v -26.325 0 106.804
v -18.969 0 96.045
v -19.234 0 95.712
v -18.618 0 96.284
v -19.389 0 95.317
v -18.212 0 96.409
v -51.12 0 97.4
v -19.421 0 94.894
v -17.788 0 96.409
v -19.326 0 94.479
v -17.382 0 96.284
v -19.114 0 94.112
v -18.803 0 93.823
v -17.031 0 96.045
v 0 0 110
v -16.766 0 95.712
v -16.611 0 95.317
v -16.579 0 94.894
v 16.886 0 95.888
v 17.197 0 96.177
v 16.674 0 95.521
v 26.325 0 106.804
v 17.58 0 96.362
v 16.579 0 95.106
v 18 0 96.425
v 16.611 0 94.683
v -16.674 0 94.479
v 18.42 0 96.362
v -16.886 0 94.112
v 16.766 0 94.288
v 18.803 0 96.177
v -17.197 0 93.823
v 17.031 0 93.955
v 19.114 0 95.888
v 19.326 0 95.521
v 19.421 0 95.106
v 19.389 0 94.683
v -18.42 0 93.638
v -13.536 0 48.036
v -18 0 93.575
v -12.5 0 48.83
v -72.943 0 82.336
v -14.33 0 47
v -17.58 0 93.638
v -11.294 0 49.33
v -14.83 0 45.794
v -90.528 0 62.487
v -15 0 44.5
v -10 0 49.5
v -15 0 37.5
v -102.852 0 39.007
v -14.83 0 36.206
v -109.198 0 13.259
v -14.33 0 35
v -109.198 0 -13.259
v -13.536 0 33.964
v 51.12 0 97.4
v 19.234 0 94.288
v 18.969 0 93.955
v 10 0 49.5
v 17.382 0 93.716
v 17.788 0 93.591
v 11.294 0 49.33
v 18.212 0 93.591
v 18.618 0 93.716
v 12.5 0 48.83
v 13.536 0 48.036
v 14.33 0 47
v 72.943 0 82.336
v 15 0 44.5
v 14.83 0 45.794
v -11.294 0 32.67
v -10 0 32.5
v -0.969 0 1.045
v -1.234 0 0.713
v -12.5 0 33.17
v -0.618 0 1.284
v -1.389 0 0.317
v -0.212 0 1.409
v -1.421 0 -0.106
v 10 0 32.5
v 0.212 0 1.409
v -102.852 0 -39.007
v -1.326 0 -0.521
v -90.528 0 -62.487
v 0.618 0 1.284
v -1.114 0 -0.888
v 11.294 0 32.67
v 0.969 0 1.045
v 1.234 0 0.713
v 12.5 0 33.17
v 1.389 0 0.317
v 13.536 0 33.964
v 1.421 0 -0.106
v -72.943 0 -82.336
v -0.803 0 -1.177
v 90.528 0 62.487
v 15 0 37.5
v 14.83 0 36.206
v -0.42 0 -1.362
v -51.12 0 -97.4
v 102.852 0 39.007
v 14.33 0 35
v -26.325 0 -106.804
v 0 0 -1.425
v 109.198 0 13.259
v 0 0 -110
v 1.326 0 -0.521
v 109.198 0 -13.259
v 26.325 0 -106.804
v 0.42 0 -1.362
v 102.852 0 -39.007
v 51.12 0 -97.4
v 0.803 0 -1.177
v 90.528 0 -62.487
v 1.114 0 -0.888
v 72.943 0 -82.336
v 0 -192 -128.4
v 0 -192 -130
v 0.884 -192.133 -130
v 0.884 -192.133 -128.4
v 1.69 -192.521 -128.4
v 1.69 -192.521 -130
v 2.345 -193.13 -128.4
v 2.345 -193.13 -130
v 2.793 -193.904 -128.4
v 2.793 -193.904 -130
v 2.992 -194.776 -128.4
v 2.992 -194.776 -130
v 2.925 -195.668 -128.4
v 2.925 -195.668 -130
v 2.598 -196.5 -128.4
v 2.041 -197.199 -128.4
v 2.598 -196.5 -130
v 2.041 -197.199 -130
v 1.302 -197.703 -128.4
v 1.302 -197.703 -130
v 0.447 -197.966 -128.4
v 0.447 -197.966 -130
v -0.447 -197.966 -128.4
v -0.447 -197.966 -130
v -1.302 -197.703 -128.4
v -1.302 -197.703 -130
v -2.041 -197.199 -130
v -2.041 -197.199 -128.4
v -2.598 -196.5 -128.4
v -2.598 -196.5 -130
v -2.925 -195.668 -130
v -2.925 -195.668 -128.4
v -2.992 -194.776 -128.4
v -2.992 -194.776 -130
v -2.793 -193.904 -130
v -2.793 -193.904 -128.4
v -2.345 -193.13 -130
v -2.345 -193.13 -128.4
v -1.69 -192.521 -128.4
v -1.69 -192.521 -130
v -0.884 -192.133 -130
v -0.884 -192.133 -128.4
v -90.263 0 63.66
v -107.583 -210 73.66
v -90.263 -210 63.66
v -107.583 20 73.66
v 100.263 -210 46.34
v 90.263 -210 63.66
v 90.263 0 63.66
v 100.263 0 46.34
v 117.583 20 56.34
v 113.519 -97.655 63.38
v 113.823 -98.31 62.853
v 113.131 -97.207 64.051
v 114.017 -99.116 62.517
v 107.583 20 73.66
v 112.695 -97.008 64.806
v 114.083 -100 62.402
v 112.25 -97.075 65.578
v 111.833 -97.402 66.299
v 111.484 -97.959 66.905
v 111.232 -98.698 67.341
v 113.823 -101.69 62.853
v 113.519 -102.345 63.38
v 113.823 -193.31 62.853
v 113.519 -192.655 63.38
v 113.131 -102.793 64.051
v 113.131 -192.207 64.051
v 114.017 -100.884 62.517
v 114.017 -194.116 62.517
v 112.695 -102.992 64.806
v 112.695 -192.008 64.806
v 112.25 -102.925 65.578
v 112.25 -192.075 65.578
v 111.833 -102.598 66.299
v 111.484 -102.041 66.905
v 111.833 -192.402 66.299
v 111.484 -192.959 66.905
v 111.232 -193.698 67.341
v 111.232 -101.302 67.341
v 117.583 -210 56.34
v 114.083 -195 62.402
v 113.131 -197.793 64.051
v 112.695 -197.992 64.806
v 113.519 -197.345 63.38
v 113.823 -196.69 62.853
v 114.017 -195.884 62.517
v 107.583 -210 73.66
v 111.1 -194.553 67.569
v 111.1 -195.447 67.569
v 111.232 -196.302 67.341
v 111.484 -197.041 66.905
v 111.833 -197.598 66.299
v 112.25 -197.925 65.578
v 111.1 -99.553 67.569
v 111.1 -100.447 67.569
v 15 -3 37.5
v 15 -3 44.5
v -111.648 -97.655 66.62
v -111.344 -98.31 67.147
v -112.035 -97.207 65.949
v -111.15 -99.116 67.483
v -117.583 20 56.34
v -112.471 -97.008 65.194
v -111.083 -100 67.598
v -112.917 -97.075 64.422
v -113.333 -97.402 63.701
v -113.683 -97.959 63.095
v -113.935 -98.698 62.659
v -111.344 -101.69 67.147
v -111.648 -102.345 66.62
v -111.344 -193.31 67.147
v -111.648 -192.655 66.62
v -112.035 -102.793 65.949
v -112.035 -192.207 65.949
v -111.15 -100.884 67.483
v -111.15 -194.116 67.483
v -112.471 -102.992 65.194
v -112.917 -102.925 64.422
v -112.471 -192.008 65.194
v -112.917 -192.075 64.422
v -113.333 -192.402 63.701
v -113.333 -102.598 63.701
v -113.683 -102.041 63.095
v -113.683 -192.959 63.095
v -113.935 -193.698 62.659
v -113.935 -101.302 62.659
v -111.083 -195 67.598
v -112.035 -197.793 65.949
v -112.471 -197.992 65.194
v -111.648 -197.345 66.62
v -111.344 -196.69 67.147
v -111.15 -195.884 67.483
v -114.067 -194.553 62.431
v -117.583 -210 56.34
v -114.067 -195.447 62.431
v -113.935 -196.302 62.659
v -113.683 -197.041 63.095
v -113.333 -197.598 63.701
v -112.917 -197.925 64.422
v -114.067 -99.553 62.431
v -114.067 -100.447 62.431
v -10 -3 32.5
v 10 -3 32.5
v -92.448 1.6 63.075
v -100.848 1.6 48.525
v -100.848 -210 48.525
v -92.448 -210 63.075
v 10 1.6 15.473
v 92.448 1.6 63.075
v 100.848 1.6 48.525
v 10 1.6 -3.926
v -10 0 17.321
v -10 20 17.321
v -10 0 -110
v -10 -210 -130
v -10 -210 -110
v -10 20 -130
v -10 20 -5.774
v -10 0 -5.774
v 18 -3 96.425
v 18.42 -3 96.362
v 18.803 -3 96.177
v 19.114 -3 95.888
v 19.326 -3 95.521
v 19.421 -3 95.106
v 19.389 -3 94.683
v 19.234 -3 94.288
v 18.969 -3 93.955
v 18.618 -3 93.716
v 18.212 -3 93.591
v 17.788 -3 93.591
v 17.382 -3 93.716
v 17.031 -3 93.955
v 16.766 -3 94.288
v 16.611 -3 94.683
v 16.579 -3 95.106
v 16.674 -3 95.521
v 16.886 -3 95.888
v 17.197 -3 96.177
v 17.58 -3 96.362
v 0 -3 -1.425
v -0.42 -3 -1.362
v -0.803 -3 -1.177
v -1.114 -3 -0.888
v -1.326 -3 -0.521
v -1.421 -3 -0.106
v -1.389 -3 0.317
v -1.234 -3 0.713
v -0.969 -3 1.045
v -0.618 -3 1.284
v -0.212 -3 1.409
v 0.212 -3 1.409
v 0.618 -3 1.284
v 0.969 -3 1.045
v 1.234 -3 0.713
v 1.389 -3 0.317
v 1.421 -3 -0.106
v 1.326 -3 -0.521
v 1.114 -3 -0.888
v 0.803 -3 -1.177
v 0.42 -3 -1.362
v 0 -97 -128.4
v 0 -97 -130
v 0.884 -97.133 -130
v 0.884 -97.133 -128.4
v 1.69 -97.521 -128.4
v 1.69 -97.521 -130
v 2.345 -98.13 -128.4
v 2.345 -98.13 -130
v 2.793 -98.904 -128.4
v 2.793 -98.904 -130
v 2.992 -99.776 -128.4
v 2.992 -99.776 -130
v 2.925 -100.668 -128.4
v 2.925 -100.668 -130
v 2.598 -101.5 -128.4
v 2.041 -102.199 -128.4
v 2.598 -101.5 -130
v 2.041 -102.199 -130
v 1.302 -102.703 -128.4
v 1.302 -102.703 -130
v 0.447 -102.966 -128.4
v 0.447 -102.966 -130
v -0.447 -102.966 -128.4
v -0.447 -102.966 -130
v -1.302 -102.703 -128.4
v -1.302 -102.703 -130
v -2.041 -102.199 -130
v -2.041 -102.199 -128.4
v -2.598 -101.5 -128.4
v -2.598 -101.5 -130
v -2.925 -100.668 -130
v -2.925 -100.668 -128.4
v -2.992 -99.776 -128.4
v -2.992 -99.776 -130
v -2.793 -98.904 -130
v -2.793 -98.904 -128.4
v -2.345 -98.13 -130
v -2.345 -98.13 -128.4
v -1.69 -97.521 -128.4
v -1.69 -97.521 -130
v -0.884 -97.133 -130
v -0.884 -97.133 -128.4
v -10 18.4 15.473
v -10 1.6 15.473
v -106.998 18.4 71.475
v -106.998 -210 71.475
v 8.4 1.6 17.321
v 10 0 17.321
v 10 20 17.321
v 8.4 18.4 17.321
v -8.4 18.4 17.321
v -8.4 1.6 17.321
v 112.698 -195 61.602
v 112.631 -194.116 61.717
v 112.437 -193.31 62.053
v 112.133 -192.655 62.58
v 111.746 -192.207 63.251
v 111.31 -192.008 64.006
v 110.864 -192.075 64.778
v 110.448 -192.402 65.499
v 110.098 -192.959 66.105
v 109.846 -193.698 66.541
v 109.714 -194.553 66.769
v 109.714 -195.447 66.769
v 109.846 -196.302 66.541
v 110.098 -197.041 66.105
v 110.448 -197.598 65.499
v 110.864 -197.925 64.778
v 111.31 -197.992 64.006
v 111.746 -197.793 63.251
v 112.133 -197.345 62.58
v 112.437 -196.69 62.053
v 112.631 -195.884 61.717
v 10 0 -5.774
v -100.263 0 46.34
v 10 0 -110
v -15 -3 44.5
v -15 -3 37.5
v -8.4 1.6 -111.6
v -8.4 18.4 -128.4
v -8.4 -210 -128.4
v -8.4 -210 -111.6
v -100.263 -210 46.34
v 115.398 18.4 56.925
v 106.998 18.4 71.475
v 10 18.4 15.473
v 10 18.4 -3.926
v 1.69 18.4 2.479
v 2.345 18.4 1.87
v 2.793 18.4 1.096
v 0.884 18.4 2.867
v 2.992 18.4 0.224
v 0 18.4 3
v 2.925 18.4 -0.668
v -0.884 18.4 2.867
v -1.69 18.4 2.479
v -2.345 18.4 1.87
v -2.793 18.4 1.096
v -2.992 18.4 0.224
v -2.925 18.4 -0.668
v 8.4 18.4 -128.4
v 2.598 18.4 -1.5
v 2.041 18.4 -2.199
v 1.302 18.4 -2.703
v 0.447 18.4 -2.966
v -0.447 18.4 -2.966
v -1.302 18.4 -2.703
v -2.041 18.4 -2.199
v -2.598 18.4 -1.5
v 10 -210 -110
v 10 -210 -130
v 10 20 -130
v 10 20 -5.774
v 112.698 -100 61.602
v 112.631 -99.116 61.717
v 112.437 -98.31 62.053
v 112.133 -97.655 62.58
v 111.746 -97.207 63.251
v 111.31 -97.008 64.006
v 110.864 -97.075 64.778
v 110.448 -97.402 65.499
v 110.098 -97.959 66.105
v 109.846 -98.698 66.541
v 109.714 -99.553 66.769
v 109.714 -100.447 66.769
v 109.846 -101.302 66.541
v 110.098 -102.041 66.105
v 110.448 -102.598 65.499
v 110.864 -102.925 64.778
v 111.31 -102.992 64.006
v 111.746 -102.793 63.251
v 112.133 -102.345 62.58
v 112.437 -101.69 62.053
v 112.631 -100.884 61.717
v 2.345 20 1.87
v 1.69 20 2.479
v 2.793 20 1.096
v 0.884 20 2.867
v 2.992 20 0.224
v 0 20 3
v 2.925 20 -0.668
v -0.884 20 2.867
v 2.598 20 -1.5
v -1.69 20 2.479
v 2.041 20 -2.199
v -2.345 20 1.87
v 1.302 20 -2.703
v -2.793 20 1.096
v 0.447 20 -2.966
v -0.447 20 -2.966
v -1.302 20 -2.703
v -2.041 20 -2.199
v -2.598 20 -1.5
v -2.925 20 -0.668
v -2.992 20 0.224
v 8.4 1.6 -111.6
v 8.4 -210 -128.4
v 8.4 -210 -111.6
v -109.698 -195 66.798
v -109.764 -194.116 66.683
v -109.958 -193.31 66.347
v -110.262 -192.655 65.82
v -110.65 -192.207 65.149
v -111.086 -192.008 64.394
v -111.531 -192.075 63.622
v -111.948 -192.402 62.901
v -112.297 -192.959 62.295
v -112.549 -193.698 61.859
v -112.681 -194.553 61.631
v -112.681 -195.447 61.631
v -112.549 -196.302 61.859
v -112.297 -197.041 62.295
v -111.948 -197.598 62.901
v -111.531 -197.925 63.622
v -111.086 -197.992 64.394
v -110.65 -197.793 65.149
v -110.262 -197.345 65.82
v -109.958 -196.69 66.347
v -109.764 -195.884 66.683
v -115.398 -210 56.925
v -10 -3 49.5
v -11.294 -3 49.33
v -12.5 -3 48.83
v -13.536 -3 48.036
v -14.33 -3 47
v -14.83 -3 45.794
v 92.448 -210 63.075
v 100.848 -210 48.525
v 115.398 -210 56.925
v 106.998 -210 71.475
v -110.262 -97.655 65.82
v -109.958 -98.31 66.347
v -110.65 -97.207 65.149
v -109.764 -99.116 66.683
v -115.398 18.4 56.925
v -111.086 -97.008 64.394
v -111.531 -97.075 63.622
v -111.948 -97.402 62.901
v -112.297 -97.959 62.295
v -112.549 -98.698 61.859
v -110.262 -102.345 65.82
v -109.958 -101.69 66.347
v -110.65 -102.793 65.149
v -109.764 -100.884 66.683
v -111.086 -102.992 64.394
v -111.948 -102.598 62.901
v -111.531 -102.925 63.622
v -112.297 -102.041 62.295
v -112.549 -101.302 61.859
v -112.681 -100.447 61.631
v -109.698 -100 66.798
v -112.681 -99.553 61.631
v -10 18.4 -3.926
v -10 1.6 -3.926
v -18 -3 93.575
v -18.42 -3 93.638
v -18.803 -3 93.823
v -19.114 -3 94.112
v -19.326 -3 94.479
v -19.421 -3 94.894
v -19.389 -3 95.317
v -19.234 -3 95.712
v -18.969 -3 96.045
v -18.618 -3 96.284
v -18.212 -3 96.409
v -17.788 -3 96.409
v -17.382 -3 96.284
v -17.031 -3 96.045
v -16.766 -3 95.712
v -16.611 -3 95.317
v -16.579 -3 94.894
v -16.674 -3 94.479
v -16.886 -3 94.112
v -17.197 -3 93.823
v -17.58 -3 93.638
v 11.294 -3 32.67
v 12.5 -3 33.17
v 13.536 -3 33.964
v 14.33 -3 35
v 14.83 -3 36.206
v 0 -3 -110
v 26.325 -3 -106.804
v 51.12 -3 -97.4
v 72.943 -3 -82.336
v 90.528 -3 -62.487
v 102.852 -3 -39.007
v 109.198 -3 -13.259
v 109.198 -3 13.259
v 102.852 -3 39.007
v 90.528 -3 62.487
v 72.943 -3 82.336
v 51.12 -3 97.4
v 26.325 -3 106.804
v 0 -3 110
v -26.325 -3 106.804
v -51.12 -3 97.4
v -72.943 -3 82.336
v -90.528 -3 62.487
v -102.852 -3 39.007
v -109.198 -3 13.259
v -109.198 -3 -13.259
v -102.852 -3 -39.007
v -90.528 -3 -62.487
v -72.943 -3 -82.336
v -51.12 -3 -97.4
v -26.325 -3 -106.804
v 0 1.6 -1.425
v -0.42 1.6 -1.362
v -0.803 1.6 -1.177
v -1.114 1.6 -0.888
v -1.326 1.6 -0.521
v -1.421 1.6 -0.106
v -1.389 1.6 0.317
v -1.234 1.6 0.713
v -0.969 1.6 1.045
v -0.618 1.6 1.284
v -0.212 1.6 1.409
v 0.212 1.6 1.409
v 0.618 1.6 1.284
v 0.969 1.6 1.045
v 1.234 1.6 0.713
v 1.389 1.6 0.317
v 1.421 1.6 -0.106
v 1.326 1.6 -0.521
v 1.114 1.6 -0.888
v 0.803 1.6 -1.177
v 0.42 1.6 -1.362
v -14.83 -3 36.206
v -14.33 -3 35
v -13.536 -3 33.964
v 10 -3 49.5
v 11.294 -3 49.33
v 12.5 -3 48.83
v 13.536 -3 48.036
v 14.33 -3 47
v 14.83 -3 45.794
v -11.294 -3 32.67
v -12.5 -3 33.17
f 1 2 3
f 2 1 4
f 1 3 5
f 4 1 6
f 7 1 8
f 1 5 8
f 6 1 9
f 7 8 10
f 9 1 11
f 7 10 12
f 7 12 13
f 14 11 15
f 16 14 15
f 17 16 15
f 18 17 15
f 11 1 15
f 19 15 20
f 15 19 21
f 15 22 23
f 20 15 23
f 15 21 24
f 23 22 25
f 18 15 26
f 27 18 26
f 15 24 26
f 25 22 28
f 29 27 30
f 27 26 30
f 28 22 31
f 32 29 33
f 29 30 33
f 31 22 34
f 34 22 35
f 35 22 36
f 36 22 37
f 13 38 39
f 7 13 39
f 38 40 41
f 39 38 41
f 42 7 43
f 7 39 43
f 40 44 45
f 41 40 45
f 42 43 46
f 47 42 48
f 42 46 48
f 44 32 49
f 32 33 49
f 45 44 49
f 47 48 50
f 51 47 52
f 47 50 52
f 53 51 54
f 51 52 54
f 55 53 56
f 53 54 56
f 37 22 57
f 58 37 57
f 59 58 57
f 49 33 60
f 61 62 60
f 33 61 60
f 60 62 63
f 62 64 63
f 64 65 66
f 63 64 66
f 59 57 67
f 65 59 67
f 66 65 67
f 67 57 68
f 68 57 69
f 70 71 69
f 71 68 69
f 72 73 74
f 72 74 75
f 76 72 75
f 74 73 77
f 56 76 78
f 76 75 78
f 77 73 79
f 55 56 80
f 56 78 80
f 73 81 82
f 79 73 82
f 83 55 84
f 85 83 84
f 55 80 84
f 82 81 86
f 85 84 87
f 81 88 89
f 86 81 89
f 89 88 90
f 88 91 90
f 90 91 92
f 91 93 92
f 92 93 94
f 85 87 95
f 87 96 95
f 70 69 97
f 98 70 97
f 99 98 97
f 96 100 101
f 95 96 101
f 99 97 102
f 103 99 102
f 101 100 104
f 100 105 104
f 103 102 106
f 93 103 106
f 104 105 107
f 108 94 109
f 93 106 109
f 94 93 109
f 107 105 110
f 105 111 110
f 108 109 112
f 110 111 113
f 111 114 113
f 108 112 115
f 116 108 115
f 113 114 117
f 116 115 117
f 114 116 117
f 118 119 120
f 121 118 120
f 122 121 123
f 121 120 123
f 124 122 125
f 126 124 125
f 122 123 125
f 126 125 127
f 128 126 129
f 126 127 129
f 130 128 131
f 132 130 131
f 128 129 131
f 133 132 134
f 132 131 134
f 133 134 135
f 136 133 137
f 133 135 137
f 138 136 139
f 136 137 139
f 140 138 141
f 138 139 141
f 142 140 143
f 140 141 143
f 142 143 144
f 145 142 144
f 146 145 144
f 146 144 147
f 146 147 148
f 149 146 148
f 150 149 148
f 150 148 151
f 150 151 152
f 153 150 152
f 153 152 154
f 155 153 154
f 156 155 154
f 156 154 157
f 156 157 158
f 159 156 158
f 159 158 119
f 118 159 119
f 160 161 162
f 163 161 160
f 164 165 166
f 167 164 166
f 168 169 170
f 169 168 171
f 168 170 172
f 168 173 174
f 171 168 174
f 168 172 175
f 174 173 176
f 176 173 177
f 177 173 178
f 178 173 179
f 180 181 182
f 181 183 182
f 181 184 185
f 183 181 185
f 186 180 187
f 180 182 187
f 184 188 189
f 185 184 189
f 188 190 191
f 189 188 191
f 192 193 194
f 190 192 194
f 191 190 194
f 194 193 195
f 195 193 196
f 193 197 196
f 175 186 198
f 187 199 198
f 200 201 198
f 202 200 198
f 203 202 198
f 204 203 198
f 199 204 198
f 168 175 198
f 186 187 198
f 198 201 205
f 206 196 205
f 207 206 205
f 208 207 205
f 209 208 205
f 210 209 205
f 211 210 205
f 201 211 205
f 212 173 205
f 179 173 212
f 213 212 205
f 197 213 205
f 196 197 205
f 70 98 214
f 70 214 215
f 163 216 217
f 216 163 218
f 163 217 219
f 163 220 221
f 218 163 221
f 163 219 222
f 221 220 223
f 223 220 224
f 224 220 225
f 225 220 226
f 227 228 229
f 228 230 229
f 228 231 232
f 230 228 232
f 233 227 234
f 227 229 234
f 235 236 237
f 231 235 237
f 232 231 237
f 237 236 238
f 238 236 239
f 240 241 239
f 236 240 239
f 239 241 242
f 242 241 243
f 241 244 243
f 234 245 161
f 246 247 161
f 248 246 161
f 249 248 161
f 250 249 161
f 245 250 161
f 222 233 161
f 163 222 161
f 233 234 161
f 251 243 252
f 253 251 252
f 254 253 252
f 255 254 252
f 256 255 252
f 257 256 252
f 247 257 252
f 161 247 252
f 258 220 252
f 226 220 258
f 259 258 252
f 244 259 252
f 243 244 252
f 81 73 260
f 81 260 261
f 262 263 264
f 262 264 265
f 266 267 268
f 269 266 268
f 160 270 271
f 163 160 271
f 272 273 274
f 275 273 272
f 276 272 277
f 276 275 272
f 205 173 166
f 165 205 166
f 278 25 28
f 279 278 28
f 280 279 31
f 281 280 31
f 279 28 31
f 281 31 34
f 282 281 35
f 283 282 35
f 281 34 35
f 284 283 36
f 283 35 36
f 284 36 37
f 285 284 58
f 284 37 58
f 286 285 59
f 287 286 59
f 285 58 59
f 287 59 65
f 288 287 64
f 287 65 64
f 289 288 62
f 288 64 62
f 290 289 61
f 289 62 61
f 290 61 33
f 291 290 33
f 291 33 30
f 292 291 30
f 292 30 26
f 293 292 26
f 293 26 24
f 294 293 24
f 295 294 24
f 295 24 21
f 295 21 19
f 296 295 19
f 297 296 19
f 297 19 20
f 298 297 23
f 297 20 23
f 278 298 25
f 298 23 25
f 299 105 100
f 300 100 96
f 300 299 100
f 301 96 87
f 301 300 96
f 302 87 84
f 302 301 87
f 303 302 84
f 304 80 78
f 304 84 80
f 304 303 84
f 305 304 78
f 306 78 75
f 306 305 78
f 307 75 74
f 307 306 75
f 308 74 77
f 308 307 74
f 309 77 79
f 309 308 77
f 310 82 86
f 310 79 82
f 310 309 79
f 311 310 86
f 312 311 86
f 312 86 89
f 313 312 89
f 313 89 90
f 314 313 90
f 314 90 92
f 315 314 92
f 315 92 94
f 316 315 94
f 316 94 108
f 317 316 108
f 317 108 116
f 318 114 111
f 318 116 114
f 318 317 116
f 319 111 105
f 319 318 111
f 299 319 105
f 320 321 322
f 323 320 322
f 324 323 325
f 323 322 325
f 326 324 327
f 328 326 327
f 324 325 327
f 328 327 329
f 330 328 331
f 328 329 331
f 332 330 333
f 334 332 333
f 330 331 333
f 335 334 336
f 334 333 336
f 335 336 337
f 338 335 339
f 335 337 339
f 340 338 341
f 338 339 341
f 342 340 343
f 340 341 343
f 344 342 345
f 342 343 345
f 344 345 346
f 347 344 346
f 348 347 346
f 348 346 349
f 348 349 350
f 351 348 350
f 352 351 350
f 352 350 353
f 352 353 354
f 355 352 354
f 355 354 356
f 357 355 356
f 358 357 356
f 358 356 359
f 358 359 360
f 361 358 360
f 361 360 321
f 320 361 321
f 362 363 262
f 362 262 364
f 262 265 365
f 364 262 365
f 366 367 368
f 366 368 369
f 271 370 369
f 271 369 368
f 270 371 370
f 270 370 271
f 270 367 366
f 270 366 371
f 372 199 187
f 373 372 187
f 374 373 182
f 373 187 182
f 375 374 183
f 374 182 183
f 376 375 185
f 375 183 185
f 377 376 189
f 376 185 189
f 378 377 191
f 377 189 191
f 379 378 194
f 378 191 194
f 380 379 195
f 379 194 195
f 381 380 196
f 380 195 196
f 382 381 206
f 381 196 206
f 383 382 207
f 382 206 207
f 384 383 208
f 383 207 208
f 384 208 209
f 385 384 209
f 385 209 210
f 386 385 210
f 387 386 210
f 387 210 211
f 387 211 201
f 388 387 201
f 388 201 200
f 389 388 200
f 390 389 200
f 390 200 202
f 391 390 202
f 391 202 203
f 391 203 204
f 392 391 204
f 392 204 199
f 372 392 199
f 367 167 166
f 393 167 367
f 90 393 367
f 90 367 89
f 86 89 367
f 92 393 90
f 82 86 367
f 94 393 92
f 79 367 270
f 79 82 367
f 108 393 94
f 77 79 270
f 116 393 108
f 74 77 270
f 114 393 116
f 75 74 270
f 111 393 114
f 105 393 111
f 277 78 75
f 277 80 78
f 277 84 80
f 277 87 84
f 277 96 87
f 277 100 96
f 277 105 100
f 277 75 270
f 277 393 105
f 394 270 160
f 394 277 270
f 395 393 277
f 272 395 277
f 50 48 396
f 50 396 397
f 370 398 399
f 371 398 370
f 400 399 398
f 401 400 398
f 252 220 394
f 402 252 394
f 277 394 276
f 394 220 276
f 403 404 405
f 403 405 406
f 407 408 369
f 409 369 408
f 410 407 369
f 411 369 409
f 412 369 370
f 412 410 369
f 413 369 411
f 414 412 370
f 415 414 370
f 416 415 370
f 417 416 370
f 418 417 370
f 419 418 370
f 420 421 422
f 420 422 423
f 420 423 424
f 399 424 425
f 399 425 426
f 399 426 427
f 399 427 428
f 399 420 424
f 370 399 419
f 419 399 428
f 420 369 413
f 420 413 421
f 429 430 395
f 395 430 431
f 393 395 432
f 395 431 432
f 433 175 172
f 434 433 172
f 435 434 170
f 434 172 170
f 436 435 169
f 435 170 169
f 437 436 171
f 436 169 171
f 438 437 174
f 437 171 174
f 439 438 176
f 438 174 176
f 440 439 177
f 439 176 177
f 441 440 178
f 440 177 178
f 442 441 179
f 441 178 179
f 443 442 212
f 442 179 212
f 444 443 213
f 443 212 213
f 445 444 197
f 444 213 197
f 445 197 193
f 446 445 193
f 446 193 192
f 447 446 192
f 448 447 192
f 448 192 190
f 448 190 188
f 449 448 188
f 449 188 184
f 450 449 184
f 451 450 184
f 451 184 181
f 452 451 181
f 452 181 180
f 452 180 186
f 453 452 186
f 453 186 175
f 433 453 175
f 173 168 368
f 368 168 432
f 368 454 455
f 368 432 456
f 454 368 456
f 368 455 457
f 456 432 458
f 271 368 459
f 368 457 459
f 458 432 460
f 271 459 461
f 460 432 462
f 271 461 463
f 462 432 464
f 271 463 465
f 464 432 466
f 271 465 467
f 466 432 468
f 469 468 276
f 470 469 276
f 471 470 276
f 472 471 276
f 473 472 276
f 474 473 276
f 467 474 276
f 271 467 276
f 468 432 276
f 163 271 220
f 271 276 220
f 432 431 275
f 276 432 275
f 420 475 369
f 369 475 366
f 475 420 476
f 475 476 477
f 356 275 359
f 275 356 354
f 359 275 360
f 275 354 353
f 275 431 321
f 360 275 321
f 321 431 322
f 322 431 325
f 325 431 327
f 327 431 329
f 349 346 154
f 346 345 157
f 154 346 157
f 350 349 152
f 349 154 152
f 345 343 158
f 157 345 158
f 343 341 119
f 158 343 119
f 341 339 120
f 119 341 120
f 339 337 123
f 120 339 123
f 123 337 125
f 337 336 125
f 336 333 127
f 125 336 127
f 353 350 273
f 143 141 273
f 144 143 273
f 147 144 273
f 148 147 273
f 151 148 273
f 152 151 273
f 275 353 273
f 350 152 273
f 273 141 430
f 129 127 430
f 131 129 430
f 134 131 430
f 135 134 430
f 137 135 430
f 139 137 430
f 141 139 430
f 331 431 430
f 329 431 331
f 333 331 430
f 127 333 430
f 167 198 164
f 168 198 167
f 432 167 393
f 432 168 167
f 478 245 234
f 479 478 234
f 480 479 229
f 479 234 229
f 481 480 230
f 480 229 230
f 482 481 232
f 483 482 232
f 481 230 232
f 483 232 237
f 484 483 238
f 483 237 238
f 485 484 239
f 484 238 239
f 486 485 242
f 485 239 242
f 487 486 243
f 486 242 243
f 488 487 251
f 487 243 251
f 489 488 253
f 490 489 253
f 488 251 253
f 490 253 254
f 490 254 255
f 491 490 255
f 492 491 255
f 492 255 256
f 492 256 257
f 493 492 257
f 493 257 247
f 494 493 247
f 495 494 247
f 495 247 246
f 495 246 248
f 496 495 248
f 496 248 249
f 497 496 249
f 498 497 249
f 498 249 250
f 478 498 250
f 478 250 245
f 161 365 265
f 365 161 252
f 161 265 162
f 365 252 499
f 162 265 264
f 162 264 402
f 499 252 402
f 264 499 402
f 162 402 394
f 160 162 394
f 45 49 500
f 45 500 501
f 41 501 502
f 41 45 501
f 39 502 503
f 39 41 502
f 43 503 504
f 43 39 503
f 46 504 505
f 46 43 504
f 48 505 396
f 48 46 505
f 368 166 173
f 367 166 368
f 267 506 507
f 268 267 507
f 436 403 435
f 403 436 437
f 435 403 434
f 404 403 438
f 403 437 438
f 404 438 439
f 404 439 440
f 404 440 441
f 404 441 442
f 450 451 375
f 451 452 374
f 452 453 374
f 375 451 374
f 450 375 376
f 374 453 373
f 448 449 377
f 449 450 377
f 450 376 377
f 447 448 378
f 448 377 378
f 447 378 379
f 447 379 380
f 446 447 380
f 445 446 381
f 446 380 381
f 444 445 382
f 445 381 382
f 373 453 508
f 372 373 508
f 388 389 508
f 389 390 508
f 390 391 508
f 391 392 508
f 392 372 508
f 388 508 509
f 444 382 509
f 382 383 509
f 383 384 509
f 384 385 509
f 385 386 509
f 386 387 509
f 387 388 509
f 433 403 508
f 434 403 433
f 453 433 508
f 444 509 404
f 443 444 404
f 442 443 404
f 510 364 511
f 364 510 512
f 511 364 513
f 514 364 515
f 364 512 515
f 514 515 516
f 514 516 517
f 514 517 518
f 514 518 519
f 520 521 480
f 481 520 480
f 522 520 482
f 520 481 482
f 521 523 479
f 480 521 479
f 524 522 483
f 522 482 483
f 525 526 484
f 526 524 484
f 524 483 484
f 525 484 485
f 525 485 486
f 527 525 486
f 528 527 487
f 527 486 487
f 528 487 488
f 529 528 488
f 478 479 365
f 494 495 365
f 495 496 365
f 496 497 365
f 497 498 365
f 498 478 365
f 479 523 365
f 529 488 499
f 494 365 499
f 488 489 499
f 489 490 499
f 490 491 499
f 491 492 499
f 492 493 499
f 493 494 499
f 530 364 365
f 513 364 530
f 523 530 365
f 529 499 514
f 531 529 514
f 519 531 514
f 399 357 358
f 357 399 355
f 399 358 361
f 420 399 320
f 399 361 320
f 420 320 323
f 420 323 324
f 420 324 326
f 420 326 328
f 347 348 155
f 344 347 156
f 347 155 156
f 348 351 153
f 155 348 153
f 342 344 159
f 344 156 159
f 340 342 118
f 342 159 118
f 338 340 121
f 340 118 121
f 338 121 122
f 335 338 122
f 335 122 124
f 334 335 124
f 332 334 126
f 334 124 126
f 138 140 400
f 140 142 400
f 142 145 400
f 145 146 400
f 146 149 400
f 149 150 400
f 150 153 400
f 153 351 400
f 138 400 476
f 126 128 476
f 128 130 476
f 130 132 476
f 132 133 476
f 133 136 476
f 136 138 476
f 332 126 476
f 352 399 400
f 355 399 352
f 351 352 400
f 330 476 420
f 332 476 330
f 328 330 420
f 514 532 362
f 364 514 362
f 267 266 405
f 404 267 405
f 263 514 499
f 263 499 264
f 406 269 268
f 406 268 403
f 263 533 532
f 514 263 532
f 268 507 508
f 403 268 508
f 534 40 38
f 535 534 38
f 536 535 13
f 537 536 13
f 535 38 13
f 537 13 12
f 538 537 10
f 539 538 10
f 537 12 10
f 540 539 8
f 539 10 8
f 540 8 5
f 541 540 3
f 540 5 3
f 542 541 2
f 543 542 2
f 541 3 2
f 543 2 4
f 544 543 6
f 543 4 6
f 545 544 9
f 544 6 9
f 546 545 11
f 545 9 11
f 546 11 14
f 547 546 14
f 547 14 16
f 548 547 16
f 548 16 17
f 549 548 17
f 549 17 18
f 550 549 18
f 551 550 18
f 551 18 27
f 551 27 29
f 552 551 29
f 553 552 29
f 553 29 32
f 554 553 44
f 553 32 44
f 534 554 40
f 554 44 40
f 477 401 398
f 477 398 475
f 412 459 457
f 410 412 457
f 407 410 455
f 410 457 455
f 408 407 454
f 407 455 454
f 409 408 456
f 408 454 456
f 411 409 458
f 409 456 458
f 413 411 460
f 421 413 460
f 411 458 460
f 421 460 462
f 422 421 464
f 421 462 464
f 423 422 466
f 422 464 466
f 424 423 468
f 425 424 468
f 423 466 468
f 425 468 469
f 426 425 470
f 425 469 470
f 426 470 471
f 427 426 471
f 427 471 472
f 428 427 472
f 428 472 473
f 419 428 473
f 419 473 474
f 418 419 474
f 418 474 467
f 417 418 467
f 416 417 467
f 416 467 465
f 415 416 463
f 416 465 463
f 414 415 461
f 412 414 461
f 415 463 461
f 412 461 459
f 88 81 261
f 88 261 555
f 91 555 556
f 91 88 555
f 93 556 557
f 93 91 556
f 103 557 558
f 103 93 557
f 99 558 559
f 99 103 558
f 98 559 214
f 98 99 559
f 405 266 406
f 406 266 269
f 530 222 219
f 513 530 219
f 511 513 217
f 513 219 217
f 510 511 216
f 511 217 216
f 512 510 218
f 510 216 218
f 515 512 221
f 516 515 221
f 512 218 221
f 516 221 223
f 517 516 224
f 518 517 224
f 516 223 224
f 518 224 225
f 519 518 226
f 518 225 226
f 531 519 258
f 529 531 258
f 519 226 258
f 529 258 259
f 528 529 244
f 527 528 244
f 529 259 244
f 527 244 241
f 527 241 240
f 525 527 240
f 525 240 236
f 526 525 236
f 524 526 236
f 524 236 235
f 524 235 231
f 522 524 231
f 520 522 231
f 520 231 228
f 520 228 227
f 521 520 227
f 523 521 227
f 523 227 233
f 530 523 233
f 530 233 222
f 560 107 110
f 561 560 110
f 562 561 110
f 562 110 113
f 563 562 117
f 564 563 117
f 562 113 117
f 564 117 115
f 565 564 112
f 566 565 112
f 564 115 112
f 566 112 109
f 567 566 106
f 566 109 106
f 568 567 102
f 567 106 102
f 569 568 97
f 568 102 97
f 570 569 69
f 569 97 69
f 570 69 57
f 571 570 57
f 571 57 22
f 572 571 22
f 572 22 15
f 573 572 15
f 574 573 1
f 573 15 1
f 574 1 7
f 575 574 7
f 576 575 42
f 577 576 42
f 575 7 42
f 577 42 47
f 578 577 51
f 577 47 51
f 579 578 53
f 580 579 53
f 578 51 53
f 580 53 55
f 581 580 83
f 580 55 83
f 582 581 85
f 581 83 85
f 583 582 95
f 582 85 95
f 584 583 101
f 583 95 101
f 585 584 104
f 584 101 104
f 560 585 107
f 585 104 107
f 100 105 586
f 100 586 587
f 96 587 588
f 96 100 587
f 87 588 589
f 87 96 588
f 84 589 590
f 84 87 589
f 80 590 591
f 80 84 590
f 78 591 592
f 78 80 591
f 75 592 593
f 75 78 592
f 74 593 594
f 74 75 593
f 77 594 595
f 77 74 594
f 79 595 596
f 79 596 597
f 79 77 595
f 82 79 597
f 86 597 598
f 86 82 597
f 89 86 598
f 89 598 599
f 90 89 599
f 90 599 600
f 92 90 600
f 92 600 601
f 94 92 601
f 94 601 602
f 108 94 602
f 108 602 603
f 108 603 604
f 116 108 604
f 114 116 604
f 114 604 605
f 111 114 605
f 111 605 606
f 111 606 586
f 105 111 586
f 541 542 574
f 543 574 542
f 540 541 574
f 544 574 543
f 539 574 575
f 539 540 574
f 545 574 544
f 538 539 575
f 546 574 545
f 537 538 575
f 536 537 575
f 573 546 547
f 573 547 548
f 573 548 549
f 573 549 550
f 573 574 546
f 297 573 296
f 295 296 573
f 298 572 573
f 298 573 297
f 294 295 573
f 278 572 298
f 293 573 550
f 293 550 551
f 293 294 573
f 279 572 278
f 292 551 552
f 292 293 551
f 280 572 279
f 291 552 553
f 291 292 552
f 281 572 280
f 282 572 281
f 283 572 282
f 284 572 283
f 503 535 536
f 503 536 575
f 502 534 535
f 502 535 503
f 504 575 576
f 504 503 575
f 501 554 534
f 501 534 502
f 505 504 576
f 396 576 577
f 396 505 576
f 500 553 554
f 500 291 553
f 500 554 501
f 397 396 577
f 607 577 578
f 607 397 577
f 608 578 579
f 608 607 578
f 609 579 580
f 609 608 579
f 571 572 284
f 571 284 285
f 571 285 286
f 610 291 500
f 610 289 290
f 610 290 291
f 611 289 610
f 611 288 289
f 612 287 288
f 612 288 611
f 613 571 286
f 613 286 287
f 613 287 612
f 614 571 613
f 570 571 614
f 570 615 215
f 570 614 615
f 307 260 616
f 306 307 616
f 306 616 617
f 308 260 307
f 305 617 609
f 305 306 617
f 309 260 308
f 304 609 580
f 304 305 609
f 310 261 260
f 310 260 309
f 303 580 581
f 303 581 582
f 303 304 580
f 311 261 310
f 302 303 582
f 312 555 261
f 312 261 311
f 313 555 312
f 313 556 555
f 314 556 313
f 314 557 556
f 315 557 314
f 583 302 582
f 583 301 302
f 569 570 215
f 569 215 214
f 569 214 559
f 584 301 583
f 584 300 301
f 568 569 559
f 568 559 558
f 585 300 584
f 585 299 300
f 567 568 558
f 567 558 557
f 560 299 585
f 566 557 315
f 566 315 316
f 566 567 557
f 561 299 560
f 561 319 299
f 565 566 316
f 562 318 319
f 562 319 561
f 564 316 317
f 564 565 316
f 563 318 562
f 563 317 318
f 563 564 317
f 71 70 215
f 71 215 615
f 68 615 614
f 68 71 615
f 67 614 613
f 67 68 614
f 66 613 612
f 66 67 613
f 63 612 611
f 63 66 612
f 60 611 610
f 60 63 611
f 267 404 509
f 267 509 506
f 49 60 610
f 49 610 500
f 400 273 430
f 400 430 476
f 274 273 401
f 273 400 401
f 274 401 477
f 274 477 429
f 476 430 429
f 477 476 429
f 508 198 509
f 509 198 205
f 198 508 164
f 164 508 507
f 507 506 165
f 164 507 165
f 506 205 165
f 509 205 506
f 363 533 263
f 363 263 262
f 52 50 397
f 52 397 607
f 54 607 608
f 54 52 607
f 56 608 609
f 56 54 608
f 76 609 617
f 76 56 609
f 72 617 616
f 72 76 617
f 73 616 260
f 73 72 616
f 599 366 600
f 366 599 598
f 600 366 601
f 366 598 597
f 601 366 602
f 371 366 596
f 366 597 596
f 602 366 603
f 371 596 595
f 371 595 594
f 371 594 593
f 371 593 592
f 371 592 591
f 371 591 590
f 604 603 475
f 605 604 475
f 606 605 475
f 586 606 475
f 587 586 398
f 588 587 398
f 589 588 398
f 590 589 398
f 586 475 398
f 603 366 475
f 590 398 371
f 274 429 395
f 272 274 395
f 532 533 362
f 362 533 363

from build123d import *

# Parameters (mm, degrees)
BOSS_EXTRUDE1_DEPTH = 20
CUT_EXTRUDE1_REACH  = 304.327
SKETCH2_W           = 16.8
SKETCH2_H           = 16.8
SKETCH3_W           = 16.8
SKETCH3_H           = 16.8
CUT_EXTRUDE2_DEPTH  = 147.320508076
CUT_EXTRUDE4_REACH  = 304.327
SKETCH4_W           = 16.8
SKETCH4_H           = 16.8
CUT_EXTRUDE5_REACH  = 185.242
CUT_EXTRUDE6_REACH  = 175.638
CUT_EXTRUDE7_REACH  = 188.154
BOSS_EXTRUDE2_DEPTH = 20
CUT_EXTRUDE8_DEPTH  = 228.4
BOSS_EXTRUDE3_DEPTH = 20
SKETCH11_W          = 16.8
SKETCH11_H          = 16.8
CUT_EXTRUDE9_DEPTH  = 228.4
BOSS_EXTRUDE4_DEPTH = 20
CUT_EXTRUDE10_DEPTH = 228.4
CUT_EXTRUDE11_REACH = 369.562
SKETCH14_R          = 3
CUT_EXTRUDE12_REACH = 317.283
SKETCH15_R          = 3
CUT_EXTRUDE13_REACH = 369.562
SKETCH16_R          = 3
SKETCH17_R          = 110
BOSS_EXTRUDE6_DEPTH = 3
SKETCH18_R          = 3
CUT_EXTRUDE14_DEPTH = 1.6
CUT_EXTRUDE15_START = -4.6
SKETCH19_R          = 1.425
CUT_EXTRUDE15_DEPTH = 4.6
SKETCH20_R          = 1.425
CUT_EXTRUDE16_DEPTH = 3


with BuildPart() as part:
    # Sketch1 → Boss-Extrude1 (new body)
    with BuildSketch(Plane(origin=(0, 0, 0), x_dir=(1, 0, 0), z_dir=(0, 1, 0))):
        Polygon((-10, 130), (10, 130), (10, 5.773502692), (117.583302492, -56.339745962), (107.583302492, -73.660254038), (10, -17.320508076), (-10, -17.320508076), (-107.583302492, -73.660254038), (-117.583302492, -56.339745962), (-10, 5.773502692), align=None)
    extrude(amount=BOSS_EXTRUDE1_DEPTH)

    # Cut-Extrude1: up to this plane
    cut_extrude1_end = Plane(origin=(10, 20, -130), z_dir=(-1, 0, 0))
    # Sketch2 → Cut-Extrude1 (cut, up to the surface)
    with BuildSketch(Plane(origin=(112.583302492, 0, 65), x_dir=(0.4999999999999971, 0, -0.8660254037844403), z_dir=(0.8660254037844404, 0, 0.49999999999999717)), mode=Mode.PRIVATE) as cut_extrude1_sk1:
        with Locations((0, 10)):
            Rectangle(SKETCH2_W, SKETCH2_H)
    cut_extrude1_tool1 = split(extrude(cut_extrude1_sk1.sketch, amount=-CUT_EXTRUDE1_REACH, mode=Mode.PRIVATE), bisect_by=cut_extrude1_end, keep=Keep.BOTH, mode=Mode.PRIVATE)
    add(cut_extrude1_tool1.solids().sort_by_distance((112.583302, 10, 65))[0], mode=Mode.SUBTRACT)

    # Sketch3 → Cut-Extrude2 (cut)
    with BuildSketch(Plane(origin=(0, 0, -130), x_dir=(-1, 0, 0), z_dir=(0, 0, -1))):
        with Locations((0, 10)):
            Rectangle(SKETCH3_W, SKETCH3_H)
    extrude(amount=-CUT_EXTRUDE2_DEPTH, mode=Mode.SUBTRACT)

    # Cut-Extrude4: up to this plane
    cut_extrude4_end = Plane(origin=(-10, 20, -130), z_dir=(1, 0, 0))
    # Sketch4 → Cut-Extrude4 (cut, up to the surface)
    with BuildSketch(Plane(origin=(-112.583302492, 0, 65), x_dir=(0.5000000000000071, 0, 0.8660254037844346), z_dir=(-0.8660254037844346, 0, 0.5000000000000071)), mode=Mode.PRIVATE) as cut_extrude4_sk1:
        with Locations((0, 10)):
            Rectangle(SKETCH4_W, SKETCH4_H)
    cut_extrude4_tool1 = split(extrude(cut_extrude4_sk1.sketch, amount=-CUT_EXTRUDE4_REACH, mode=Mode.PRIVATE), bisect_by=cut_extrude4_end, keep=Keep.BOTH, mode=Mode.PRIVATE)
    add(cut_extrude4_tool1.solids().sort_by_distance((-112.583302, 10, 65))[0], mode=Mode.SUBTRACT)

    # Cut-Extrude5: up to this face of the body (flat: up to its plane)
    cut_extrude5_end = Plane(part.part.faces().sort_by_distance((10, 10, -67.886751346))[0])
    # Sketch5 → Cut-Extrude5 (cut, up to the picked face)
    with BuildSketch(Plane.ZY.offset(10), mode=Mode.PRIVATE) as cut_extrude5_sk1:
        Polygon((-130, 20), (-110, 0), (-130, 0), align=None)
    cut_extrude5_tool1 = split(extrude(cut_extrude5_sk1.sketch, amount=-CUT_EXTRUDE5_REACH, mode=Mode.PRIVATE), bisect_by=cut_extrude5_end, keep=Keep.BOTH, mode=Mode.PRIVATE)
    add(cut_extrude5_tool1.solids().sort_by(Axis((-10, 6.666667, -123.333333), (1, 0, 0)))[0], mode=Mode.SUBTRACT)

    # Cut-Extrude6: up to this face of the body (flat: up to its plane)
    cut_extrude6_end = Plane(part.part.faces().sort_by_distance((-58.791651246, 10, 45.490381057))[0])
    # Sketch6 → Cut-Extrude6 (cut, up to the picked face)
    with BuildSketch(Plane(origin=(-5, 0, -8.660254038), x_dir=(-0.8660254037844363, 0, 0.5000000000000042), z_dir=(-0.5000000000000042, 0, -0.8660254037844363)), mode=Mode.PRIVATE) as cut_extrude6_sk1:
        Polygon((130, 20), (110, 0), (130, 0), align=None)
    cut_extrude6_tool1 = split(extrude(cut_extrude6_sk1.sketch, amount=-CUT_EXTRUDE6_REACH, mode=Mode.PRIVATE), bisect_by=cut_extrude6_end, keep=Keep.BOTH, mode=Mode.PRIVATE)
    add(cut_extrude6_tool1.solids().sort_by(Axis((-111.8098, 6.666667, 53.006413), (0.5000000000000042, 0, 0.8660254037844363)))[0], mode=Mode.SUBTRACT)

    # Cut-Extrude7: up to this face of the body (flat: up to its plane)
    cut_extrude7_end = Plane(part.part.faces().sort_by_distance((63.791651246, 10, 25.283121635))[0])
    # Sketch7 → Cut-Extrude7 (cut, up to the picked face)
    with BuildSketch(Plane(origin=(-5, 0, 8.660254038), x_dir=(0.8660254037844403, 0, 0.4999999999999973), z_dir=(-0.4999999999999973, 0, 0.8660254037844403)), mode=Mode.PRIVATE) as cut_extrude7_sk1:
        Polygon((130, 20), (130, 0), (110, 0), align=None)
    cut_extrude7_tool1 = split(extrude(cut_extrude7_sk1.sketch, amount=-CUT_EXTRUDE7_REACH, mode=Mode.PRIVATE), bisect_by=cut_extrude7_end, keep=Keep.BOTH, mode=Mode.PRIVATE)
    add(cut_extrude7_tool1.solids().sort_by(Axis((101.8098, 6.666667, 70.326921), (0.4999999999999973, 0, -0.8660254037844403)))[0], mode=Mode.SUBTRACT)

    # Sketch8 → Boss-Extrude2 (add)
    with BuildSketch(Plane(origin=(-5, 0, 8.660254038), x_dir=(0.8660254037844403, 0, 0.4999999999999973), z_dir=(-0.4999999999999973, 0, 0.8660254037844403))):
        Polygon((130, 20), (130, -210), (110, -210), (110, 0), align=None)
    extrude(amount=-BOSS_EXTRUDE2_DEPTH)

    # Sketch9 → Cut-Extrude8 (cut)
    with BuildSketch(Plane.XZ.offset(210)):
        Polygon((100.848435062, 48.525386608), (115.397661846, 56.925386608), (106.997661846, 71.474613392), (92.448435062, 63.074613392), align=None)
    extrude(amount=-CUT_EXTRUDE8_DEPTH, mode=Mode.SUBTRACT)

    # Sketch10 → Boss-Extrude3 (add)
    with BuildSketch(Plane(origin=(10, 0, 0), x_dir=(0, 0, -1), z_dir=(1, 0, 0))):
        Polygon((130, 20), (130, -210), (110, -210), (110, 0), align=None)
    extrude(amount=-BOSS_EXTRUDE3_DEPTH)

    # Sketch11 → Cut-Extrude9 (cut)
    with BuildSketch(Plane.XZ.offset(210)):
        with Locations((0, -120)):
            Rectangle(SKETCH11_W, SKETCH11_H)
    extrude(amount=-CUT_EXTRUDE9_DEPTH, mode=Mode.SUBTRACT)

    # Sketch12 → Boss-Extrude4 (add)
    with BuildSketch(Plane(origin=(-5, 0, -8.660254038), x_dir=(-0.8660254037844363, 0, 0.5000000000000042), z_dir=(-0.5000000000000042, 0, -0.8660254037844363))):
        Polygon((130, 20), (130, -210), (110, -210), (110, 0), align=None)
    extrude(amount=-BOSS_EXTRUDE4_DEPTH)

    # Sketch13 → Cut-Extrude10 (cut)
    with BuildSketch(Plane.XZ.offset(210)):
        Polygon((-92.448435062, 63.074613392), (-106.997661846, 71.474613392), (-115.397661846, 56.925386608), (-100.848435062, 48.525386608), align=None)
    extrude(amount=-CUT_EXTRUDE10_DEPTH, mode=Mode.SUBTRACT)

    # Sketch14 → Cut-Extrude11 (cut, up to next)
    with BuildSketch(Plane(origin=(-112.583302492, 0, 65), x_dir=(0.5000000000000042, 0, 0.8660254037844363), z_dir=(-0.8660254037844363, -1.0553382477548879e-15, 0.5000000000000042)), mode=Mode.PRIVATE) as cut_extrude11_sk1:
        with Locations((0, -100)):
            Circle(SKETCH14_R)
    cut_extrude11_tool1 = extrude(cut_extrude11_sk1.sketch, amount=-CUT_EXTRUDE11_REACH, mode=Mode.PRIVATE) & part.part
    # Sketch14 → Cut-Extrude11 (cut, up to next)
    with BuildSketch(Plane(origin=(-112.583302492, 0, 65), x_dir=(0.5000000000000042, 0, 0.8660254037844363), z_dir=(-0.8660254037844363, -1.0553382477548879e-15, 0.5000000000000042)), mode=Mode.PRIVATE) as cut_extrude11_sk2:
        with Locations((0, -195)):
            Circle(SKETCH14_R)
    cut_extrude11_tool2 = extrude(cut_extrude11_sk2.sketch, amount=-CUT_EXTRUDE11_REACH, mode=Mode.PRIVATE) & part.part
    add(cut_extrude11_tool1.solids().sort_by_distance((-112.583302, -100, 65))[0], mode=Mode.SUBTRACT)
    add(cut_extrude11_tool2.solids().sort_by_distance((-112.583302, -195, 65))[0], mode=Mode.SUBTRACT)

    # Sketch15 → Cut-Extrude12 (cut, up to next)
    with BuildSketch(Plane(origin=(0, 0, -130), x_dir=(-1, 0, 0), z_dir=(0, 0, -1)), mode=Mode.PRIVATE) as cut_extrude12_sk1:
        with Locations(Location((0, -100, 0), (0, 0, 90))):
            Circle(SKETCH15_R)
    cut_extrude12_tool1 = extrude(cut_extrude12_sk1.sketch, amount=-CUT_EXTRUDE12_REACH, mode=Mode.PRIVATE) & part.part
    # Sketch15 → Cut-Extrude12 (cut, up to next)
    with BuildSketch(Plane(origin=(0, 0, -130), x_dir=(-1, 0, 0), z_dir=(0, 0, -1)), mode=Mode.PRIVATE) as cut_extrude12_sk2:
        with Locations(Location((0, -195, 0), (0, 0, 90))):
            Circle(SKETCH15_R)
    cut_extrude12_tool2 = extrude(cut_extrude12_sk2.sketch, amount=-CUT_EXTRUDE12_REACH, mode=Mode.PRIVATE) & part.part
    add(cut_extrude12_tool1.solids().sort_by_distance((0, -100, -130))[0], mode=Mode.SUBTRACT)
    add(cut_extrude12_tool2.solids().sort_by_distance((0, -195, -130))[0], mode=Mode.SUBTRACT)

    # Sketch16 → Cut-Extrude13 (cut, up to next)
    with BuildSketch(Plane(origin=(112.583302492, 0, 65), x_dir=(0.4999999999999973, 0, -0.8660254037844403), z_dir=(0.8660254037844403, 0, 0.4999999999999973)), mode=Mode.PRIVATE) as cut_extrude13_sk1:
        with Locations((0, -100)):
            Circle(SKETCH16_R)
    cut_extrude13_tool1 = extrude(cut_extrude13_sk1.sketch, amount=-CUT_EXTRUDE13_REACH, mode=Mode.PRIVATE) & part.part
    # Sketch16 → Cut-Extrude13 (cut, up to next)
    with BuildSketch(Plane(origin=(112.583302492, 0, 65), x_dir=(0.4999999999999973, 0, -0.8660254037844403), z_dir=(0.8660254037844403, 0, 0.4999999999999973)), mode=Mode.PRIVATE) as cut_extrude13_sk2:
        with Locations((0, -195)):
            Circle(SKETCH16_R)
    cut_extrude13_tool2 = extrude(cut_extrude13_sk2.sketch, amount=-CUT_EXTRUDE13_REACH, mode=Mode.PRIVATE) & part.part
    add(cut_extrude13_tool1.solids().sort_by_distance((112.583302, -100, 65))[0], mode=Mode.SUBTRACT)
    add(cut_extrude13_tool2.solids().sort_by_distance((112.583302, -195, 65))[0], mode=Mode.SUBTRACT)

    # Sketch18 → Cut-Extrude14 (cut)
    with BuildSketch(Plane(origin=(0, 20, 0), x_dir=(1, 0, 0), z_dir=(0, 1, 0))):
        with Locations(Location((0, 0, 0), (0, 0, 270))):
            Circle(SKETCH18_R)
    extrude(amount=-CUT_EXTRUDE14_DEPTH, mode=Mode.SUBTRACT)


with BuildPart() as body_2:
    # Sketch17 → Boss-Extrude6 (new body)
    with BuildSketch(Plane.XZ):
        with Locations(Location((0, 0, 0), (0, 0, 270))):
            Circle(SKETCH17_R)
    extrude(amount=BOSS_EXTRUDE6_DEPTH)


with BuildPart() as cut_extrude15_tool:
    # Sketch19 → Cut-Extrude15 (new body)
    with BuildSketch(Plane(origin=(0, 1.6, 0), x_dir=(1, 0, 0), z_dir=(0, 1, 0)).offset(CUT_EXTRUDE15_START)):
        with Locations(Location((0, 0, 0), (0, 0, 90))):
            Circle(SKETCH19_R)
    extrude(amount=CUT_EXTRUDE15_DEPTH)


with BuildPart() as part_1:
    add(part.part)

    # Cut-Extrude15: cut by cut_extrude15_tool
    add(cut_extrude15_tool.part, mode=Mode.SUBTRACT)


with BuildPart() as body_2_1:
    add(body_2.part)

    # Cut-Extrude15: cut by cut_extrude15_tool
    add(cut_extrude15_tool.part, mode=Mode.SUBTRACT)

    # Sketch20 → Cut-Extrude16 (cut)
    with BuildSketch(Plane(origin=(0, 0, 0), x_dir=(1, 0, 0), z_dir=(0, 1, 0))):
        with Locations(Location((18, -95, 0), (0, 0, 270))):
            Circle(SKETCH20_R)
        with Locations(Location((-18, -95, 0), (0, 0, 90))):
            Circle(SKETCH20_R)
        with BuildLine():
            Line((-10, -32.5), (10, -32.5))
            ThreePointArc((10, -32.5), (13.535533906, -33.964466094), (15, -37.5))
            Line((15, -37.5), (15, -44.5))
            ThreePointArc((15, -44.5), (13.535533906, -48.035533906), (10, -49.5))
            Line((10, -49.5), (-10, -49.5))
            ThreePointArc((-10, -49.5), (-13.535533906, -48.035533906), (-15, -44.5))
            Line((-15, -44.5), (-15, -37.5))
            ThreePointArc((-15, -37.5), (-13.535533906, -33.964466094), (-10, -32.5))
        make_face()
    extrude(amount=-CUT_EXTRUDE16_DEPTH, mode=Mode.SUBTRACT)


solid = Compound([part_1.part, body_2_1.part])
